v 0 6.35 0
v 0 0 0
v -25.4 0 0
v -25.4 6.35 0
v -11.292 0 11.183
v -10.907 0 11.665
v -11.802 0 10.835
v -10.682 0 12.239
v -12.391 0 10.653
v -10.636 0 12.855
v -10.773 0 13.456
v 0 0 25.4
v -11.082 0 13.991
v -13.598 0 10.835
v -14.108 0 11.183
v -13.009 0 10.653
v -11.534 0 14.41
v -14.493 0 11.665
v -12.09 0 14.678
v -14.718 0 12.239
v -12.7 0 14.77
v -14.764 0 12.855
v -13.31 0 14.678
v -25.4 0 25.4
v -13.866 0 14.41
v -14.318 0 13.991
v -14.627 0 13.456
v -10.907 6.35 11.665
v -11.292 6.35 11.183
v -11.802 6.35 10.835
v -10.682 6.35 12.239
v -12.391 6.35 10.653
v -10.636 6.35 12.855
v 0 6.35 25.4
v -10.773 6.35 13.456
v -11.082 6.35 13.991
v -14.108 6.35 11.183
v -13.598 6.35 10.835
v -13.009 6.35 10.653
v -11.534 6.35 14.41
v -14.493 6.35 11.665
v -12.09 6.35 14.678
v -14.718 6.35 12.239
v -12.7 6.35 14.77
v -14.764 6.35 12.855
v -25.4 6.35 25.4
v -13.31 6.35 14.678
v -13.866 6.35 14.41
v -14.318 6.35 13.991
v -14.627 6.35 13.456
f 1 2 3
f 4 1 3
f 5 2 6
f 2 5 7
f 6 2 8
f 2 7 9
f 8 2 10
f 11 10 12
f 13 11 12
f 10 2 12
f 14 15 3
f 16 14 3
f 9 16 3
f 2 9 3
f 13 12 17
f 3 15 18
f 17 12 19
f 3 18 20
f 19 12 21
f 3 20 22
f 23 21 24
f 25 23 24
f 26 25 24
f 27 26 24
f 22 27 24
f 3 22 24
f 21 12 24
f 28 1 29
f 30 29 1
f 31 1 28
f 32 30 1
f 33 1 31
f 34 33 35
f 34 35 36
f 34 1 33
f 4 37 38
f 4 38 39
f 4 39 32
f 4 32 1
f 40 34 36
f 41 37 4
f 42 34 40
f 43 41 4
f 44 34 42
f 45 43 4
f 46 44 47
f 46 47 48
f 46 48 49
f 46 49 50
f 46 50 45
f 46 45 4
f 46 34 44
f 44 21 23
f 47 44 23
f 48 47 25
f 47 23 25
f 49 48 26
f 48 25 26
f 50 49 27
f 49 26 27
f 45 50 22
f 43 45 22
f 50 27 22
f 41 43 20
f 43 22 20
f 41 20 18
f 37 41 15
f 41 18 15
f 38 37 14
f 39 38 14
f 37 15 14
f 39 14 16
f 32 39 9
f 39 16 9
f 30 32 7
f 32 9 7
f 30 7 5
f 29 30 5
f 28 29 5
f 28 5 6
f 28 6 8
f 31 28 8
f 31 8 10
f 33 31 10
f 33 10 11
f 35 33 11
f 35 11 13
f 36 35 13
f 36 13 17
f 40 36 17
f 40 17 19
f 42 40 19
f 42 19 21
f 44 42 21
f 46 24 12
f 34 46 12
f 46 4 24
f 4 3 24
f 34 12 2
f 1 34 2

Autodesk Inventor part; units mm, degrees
ref_plane "YZ Plane" through (0, 0, 0) normal (1, 0, 0) x (0, 1, 0)
ref_plane "XZ Plane" through (0, 0, 0) normal (0, 1, 0) x (-1, 0, 0)
ref_plane "XY Plane" through (0, 0, 0) normal (0, 0, 1) x (1, 0, 0)
sketch "Sketch1" plane through (0, 0, 0) normal (0, 1, 0) x (-1, 0, 0)
  line L0 (0, 0) -> (25.4, 0)
  line L1 (25.4, 0) -> (25.4, 25.4)
  line L2 (25.4, 25.4) -> (0, 25.4)
  line L3 (0, 25.4) -> (0, 0)
  dimension "d0" = 25.4
  dimension "d1" = 25.4
extrude "Extrusion1" add sketch "Sketch1" along normal blind 6.35
sketch "Sketch2" plane through (0, 6.35, 0) normal (0, 1, 0) x (1, 0, 0)
  line L0 (-25.4, 0) -> (-25.4, -25.4) projected
  line L1 (0, 0) -> (-25.4, 0) projected
  point P0 (-12.7, -12.7)
  point P1 (-25.4, -12.7)
  point P2 (-12.7, 0)
hole "Hole1" at (-12.7, 6.35, 12.7) direction (0, -1, 0) diameter 4.1402 end through all
properties part number ".25inAlluminumspacer-ver1-1111-2018"
